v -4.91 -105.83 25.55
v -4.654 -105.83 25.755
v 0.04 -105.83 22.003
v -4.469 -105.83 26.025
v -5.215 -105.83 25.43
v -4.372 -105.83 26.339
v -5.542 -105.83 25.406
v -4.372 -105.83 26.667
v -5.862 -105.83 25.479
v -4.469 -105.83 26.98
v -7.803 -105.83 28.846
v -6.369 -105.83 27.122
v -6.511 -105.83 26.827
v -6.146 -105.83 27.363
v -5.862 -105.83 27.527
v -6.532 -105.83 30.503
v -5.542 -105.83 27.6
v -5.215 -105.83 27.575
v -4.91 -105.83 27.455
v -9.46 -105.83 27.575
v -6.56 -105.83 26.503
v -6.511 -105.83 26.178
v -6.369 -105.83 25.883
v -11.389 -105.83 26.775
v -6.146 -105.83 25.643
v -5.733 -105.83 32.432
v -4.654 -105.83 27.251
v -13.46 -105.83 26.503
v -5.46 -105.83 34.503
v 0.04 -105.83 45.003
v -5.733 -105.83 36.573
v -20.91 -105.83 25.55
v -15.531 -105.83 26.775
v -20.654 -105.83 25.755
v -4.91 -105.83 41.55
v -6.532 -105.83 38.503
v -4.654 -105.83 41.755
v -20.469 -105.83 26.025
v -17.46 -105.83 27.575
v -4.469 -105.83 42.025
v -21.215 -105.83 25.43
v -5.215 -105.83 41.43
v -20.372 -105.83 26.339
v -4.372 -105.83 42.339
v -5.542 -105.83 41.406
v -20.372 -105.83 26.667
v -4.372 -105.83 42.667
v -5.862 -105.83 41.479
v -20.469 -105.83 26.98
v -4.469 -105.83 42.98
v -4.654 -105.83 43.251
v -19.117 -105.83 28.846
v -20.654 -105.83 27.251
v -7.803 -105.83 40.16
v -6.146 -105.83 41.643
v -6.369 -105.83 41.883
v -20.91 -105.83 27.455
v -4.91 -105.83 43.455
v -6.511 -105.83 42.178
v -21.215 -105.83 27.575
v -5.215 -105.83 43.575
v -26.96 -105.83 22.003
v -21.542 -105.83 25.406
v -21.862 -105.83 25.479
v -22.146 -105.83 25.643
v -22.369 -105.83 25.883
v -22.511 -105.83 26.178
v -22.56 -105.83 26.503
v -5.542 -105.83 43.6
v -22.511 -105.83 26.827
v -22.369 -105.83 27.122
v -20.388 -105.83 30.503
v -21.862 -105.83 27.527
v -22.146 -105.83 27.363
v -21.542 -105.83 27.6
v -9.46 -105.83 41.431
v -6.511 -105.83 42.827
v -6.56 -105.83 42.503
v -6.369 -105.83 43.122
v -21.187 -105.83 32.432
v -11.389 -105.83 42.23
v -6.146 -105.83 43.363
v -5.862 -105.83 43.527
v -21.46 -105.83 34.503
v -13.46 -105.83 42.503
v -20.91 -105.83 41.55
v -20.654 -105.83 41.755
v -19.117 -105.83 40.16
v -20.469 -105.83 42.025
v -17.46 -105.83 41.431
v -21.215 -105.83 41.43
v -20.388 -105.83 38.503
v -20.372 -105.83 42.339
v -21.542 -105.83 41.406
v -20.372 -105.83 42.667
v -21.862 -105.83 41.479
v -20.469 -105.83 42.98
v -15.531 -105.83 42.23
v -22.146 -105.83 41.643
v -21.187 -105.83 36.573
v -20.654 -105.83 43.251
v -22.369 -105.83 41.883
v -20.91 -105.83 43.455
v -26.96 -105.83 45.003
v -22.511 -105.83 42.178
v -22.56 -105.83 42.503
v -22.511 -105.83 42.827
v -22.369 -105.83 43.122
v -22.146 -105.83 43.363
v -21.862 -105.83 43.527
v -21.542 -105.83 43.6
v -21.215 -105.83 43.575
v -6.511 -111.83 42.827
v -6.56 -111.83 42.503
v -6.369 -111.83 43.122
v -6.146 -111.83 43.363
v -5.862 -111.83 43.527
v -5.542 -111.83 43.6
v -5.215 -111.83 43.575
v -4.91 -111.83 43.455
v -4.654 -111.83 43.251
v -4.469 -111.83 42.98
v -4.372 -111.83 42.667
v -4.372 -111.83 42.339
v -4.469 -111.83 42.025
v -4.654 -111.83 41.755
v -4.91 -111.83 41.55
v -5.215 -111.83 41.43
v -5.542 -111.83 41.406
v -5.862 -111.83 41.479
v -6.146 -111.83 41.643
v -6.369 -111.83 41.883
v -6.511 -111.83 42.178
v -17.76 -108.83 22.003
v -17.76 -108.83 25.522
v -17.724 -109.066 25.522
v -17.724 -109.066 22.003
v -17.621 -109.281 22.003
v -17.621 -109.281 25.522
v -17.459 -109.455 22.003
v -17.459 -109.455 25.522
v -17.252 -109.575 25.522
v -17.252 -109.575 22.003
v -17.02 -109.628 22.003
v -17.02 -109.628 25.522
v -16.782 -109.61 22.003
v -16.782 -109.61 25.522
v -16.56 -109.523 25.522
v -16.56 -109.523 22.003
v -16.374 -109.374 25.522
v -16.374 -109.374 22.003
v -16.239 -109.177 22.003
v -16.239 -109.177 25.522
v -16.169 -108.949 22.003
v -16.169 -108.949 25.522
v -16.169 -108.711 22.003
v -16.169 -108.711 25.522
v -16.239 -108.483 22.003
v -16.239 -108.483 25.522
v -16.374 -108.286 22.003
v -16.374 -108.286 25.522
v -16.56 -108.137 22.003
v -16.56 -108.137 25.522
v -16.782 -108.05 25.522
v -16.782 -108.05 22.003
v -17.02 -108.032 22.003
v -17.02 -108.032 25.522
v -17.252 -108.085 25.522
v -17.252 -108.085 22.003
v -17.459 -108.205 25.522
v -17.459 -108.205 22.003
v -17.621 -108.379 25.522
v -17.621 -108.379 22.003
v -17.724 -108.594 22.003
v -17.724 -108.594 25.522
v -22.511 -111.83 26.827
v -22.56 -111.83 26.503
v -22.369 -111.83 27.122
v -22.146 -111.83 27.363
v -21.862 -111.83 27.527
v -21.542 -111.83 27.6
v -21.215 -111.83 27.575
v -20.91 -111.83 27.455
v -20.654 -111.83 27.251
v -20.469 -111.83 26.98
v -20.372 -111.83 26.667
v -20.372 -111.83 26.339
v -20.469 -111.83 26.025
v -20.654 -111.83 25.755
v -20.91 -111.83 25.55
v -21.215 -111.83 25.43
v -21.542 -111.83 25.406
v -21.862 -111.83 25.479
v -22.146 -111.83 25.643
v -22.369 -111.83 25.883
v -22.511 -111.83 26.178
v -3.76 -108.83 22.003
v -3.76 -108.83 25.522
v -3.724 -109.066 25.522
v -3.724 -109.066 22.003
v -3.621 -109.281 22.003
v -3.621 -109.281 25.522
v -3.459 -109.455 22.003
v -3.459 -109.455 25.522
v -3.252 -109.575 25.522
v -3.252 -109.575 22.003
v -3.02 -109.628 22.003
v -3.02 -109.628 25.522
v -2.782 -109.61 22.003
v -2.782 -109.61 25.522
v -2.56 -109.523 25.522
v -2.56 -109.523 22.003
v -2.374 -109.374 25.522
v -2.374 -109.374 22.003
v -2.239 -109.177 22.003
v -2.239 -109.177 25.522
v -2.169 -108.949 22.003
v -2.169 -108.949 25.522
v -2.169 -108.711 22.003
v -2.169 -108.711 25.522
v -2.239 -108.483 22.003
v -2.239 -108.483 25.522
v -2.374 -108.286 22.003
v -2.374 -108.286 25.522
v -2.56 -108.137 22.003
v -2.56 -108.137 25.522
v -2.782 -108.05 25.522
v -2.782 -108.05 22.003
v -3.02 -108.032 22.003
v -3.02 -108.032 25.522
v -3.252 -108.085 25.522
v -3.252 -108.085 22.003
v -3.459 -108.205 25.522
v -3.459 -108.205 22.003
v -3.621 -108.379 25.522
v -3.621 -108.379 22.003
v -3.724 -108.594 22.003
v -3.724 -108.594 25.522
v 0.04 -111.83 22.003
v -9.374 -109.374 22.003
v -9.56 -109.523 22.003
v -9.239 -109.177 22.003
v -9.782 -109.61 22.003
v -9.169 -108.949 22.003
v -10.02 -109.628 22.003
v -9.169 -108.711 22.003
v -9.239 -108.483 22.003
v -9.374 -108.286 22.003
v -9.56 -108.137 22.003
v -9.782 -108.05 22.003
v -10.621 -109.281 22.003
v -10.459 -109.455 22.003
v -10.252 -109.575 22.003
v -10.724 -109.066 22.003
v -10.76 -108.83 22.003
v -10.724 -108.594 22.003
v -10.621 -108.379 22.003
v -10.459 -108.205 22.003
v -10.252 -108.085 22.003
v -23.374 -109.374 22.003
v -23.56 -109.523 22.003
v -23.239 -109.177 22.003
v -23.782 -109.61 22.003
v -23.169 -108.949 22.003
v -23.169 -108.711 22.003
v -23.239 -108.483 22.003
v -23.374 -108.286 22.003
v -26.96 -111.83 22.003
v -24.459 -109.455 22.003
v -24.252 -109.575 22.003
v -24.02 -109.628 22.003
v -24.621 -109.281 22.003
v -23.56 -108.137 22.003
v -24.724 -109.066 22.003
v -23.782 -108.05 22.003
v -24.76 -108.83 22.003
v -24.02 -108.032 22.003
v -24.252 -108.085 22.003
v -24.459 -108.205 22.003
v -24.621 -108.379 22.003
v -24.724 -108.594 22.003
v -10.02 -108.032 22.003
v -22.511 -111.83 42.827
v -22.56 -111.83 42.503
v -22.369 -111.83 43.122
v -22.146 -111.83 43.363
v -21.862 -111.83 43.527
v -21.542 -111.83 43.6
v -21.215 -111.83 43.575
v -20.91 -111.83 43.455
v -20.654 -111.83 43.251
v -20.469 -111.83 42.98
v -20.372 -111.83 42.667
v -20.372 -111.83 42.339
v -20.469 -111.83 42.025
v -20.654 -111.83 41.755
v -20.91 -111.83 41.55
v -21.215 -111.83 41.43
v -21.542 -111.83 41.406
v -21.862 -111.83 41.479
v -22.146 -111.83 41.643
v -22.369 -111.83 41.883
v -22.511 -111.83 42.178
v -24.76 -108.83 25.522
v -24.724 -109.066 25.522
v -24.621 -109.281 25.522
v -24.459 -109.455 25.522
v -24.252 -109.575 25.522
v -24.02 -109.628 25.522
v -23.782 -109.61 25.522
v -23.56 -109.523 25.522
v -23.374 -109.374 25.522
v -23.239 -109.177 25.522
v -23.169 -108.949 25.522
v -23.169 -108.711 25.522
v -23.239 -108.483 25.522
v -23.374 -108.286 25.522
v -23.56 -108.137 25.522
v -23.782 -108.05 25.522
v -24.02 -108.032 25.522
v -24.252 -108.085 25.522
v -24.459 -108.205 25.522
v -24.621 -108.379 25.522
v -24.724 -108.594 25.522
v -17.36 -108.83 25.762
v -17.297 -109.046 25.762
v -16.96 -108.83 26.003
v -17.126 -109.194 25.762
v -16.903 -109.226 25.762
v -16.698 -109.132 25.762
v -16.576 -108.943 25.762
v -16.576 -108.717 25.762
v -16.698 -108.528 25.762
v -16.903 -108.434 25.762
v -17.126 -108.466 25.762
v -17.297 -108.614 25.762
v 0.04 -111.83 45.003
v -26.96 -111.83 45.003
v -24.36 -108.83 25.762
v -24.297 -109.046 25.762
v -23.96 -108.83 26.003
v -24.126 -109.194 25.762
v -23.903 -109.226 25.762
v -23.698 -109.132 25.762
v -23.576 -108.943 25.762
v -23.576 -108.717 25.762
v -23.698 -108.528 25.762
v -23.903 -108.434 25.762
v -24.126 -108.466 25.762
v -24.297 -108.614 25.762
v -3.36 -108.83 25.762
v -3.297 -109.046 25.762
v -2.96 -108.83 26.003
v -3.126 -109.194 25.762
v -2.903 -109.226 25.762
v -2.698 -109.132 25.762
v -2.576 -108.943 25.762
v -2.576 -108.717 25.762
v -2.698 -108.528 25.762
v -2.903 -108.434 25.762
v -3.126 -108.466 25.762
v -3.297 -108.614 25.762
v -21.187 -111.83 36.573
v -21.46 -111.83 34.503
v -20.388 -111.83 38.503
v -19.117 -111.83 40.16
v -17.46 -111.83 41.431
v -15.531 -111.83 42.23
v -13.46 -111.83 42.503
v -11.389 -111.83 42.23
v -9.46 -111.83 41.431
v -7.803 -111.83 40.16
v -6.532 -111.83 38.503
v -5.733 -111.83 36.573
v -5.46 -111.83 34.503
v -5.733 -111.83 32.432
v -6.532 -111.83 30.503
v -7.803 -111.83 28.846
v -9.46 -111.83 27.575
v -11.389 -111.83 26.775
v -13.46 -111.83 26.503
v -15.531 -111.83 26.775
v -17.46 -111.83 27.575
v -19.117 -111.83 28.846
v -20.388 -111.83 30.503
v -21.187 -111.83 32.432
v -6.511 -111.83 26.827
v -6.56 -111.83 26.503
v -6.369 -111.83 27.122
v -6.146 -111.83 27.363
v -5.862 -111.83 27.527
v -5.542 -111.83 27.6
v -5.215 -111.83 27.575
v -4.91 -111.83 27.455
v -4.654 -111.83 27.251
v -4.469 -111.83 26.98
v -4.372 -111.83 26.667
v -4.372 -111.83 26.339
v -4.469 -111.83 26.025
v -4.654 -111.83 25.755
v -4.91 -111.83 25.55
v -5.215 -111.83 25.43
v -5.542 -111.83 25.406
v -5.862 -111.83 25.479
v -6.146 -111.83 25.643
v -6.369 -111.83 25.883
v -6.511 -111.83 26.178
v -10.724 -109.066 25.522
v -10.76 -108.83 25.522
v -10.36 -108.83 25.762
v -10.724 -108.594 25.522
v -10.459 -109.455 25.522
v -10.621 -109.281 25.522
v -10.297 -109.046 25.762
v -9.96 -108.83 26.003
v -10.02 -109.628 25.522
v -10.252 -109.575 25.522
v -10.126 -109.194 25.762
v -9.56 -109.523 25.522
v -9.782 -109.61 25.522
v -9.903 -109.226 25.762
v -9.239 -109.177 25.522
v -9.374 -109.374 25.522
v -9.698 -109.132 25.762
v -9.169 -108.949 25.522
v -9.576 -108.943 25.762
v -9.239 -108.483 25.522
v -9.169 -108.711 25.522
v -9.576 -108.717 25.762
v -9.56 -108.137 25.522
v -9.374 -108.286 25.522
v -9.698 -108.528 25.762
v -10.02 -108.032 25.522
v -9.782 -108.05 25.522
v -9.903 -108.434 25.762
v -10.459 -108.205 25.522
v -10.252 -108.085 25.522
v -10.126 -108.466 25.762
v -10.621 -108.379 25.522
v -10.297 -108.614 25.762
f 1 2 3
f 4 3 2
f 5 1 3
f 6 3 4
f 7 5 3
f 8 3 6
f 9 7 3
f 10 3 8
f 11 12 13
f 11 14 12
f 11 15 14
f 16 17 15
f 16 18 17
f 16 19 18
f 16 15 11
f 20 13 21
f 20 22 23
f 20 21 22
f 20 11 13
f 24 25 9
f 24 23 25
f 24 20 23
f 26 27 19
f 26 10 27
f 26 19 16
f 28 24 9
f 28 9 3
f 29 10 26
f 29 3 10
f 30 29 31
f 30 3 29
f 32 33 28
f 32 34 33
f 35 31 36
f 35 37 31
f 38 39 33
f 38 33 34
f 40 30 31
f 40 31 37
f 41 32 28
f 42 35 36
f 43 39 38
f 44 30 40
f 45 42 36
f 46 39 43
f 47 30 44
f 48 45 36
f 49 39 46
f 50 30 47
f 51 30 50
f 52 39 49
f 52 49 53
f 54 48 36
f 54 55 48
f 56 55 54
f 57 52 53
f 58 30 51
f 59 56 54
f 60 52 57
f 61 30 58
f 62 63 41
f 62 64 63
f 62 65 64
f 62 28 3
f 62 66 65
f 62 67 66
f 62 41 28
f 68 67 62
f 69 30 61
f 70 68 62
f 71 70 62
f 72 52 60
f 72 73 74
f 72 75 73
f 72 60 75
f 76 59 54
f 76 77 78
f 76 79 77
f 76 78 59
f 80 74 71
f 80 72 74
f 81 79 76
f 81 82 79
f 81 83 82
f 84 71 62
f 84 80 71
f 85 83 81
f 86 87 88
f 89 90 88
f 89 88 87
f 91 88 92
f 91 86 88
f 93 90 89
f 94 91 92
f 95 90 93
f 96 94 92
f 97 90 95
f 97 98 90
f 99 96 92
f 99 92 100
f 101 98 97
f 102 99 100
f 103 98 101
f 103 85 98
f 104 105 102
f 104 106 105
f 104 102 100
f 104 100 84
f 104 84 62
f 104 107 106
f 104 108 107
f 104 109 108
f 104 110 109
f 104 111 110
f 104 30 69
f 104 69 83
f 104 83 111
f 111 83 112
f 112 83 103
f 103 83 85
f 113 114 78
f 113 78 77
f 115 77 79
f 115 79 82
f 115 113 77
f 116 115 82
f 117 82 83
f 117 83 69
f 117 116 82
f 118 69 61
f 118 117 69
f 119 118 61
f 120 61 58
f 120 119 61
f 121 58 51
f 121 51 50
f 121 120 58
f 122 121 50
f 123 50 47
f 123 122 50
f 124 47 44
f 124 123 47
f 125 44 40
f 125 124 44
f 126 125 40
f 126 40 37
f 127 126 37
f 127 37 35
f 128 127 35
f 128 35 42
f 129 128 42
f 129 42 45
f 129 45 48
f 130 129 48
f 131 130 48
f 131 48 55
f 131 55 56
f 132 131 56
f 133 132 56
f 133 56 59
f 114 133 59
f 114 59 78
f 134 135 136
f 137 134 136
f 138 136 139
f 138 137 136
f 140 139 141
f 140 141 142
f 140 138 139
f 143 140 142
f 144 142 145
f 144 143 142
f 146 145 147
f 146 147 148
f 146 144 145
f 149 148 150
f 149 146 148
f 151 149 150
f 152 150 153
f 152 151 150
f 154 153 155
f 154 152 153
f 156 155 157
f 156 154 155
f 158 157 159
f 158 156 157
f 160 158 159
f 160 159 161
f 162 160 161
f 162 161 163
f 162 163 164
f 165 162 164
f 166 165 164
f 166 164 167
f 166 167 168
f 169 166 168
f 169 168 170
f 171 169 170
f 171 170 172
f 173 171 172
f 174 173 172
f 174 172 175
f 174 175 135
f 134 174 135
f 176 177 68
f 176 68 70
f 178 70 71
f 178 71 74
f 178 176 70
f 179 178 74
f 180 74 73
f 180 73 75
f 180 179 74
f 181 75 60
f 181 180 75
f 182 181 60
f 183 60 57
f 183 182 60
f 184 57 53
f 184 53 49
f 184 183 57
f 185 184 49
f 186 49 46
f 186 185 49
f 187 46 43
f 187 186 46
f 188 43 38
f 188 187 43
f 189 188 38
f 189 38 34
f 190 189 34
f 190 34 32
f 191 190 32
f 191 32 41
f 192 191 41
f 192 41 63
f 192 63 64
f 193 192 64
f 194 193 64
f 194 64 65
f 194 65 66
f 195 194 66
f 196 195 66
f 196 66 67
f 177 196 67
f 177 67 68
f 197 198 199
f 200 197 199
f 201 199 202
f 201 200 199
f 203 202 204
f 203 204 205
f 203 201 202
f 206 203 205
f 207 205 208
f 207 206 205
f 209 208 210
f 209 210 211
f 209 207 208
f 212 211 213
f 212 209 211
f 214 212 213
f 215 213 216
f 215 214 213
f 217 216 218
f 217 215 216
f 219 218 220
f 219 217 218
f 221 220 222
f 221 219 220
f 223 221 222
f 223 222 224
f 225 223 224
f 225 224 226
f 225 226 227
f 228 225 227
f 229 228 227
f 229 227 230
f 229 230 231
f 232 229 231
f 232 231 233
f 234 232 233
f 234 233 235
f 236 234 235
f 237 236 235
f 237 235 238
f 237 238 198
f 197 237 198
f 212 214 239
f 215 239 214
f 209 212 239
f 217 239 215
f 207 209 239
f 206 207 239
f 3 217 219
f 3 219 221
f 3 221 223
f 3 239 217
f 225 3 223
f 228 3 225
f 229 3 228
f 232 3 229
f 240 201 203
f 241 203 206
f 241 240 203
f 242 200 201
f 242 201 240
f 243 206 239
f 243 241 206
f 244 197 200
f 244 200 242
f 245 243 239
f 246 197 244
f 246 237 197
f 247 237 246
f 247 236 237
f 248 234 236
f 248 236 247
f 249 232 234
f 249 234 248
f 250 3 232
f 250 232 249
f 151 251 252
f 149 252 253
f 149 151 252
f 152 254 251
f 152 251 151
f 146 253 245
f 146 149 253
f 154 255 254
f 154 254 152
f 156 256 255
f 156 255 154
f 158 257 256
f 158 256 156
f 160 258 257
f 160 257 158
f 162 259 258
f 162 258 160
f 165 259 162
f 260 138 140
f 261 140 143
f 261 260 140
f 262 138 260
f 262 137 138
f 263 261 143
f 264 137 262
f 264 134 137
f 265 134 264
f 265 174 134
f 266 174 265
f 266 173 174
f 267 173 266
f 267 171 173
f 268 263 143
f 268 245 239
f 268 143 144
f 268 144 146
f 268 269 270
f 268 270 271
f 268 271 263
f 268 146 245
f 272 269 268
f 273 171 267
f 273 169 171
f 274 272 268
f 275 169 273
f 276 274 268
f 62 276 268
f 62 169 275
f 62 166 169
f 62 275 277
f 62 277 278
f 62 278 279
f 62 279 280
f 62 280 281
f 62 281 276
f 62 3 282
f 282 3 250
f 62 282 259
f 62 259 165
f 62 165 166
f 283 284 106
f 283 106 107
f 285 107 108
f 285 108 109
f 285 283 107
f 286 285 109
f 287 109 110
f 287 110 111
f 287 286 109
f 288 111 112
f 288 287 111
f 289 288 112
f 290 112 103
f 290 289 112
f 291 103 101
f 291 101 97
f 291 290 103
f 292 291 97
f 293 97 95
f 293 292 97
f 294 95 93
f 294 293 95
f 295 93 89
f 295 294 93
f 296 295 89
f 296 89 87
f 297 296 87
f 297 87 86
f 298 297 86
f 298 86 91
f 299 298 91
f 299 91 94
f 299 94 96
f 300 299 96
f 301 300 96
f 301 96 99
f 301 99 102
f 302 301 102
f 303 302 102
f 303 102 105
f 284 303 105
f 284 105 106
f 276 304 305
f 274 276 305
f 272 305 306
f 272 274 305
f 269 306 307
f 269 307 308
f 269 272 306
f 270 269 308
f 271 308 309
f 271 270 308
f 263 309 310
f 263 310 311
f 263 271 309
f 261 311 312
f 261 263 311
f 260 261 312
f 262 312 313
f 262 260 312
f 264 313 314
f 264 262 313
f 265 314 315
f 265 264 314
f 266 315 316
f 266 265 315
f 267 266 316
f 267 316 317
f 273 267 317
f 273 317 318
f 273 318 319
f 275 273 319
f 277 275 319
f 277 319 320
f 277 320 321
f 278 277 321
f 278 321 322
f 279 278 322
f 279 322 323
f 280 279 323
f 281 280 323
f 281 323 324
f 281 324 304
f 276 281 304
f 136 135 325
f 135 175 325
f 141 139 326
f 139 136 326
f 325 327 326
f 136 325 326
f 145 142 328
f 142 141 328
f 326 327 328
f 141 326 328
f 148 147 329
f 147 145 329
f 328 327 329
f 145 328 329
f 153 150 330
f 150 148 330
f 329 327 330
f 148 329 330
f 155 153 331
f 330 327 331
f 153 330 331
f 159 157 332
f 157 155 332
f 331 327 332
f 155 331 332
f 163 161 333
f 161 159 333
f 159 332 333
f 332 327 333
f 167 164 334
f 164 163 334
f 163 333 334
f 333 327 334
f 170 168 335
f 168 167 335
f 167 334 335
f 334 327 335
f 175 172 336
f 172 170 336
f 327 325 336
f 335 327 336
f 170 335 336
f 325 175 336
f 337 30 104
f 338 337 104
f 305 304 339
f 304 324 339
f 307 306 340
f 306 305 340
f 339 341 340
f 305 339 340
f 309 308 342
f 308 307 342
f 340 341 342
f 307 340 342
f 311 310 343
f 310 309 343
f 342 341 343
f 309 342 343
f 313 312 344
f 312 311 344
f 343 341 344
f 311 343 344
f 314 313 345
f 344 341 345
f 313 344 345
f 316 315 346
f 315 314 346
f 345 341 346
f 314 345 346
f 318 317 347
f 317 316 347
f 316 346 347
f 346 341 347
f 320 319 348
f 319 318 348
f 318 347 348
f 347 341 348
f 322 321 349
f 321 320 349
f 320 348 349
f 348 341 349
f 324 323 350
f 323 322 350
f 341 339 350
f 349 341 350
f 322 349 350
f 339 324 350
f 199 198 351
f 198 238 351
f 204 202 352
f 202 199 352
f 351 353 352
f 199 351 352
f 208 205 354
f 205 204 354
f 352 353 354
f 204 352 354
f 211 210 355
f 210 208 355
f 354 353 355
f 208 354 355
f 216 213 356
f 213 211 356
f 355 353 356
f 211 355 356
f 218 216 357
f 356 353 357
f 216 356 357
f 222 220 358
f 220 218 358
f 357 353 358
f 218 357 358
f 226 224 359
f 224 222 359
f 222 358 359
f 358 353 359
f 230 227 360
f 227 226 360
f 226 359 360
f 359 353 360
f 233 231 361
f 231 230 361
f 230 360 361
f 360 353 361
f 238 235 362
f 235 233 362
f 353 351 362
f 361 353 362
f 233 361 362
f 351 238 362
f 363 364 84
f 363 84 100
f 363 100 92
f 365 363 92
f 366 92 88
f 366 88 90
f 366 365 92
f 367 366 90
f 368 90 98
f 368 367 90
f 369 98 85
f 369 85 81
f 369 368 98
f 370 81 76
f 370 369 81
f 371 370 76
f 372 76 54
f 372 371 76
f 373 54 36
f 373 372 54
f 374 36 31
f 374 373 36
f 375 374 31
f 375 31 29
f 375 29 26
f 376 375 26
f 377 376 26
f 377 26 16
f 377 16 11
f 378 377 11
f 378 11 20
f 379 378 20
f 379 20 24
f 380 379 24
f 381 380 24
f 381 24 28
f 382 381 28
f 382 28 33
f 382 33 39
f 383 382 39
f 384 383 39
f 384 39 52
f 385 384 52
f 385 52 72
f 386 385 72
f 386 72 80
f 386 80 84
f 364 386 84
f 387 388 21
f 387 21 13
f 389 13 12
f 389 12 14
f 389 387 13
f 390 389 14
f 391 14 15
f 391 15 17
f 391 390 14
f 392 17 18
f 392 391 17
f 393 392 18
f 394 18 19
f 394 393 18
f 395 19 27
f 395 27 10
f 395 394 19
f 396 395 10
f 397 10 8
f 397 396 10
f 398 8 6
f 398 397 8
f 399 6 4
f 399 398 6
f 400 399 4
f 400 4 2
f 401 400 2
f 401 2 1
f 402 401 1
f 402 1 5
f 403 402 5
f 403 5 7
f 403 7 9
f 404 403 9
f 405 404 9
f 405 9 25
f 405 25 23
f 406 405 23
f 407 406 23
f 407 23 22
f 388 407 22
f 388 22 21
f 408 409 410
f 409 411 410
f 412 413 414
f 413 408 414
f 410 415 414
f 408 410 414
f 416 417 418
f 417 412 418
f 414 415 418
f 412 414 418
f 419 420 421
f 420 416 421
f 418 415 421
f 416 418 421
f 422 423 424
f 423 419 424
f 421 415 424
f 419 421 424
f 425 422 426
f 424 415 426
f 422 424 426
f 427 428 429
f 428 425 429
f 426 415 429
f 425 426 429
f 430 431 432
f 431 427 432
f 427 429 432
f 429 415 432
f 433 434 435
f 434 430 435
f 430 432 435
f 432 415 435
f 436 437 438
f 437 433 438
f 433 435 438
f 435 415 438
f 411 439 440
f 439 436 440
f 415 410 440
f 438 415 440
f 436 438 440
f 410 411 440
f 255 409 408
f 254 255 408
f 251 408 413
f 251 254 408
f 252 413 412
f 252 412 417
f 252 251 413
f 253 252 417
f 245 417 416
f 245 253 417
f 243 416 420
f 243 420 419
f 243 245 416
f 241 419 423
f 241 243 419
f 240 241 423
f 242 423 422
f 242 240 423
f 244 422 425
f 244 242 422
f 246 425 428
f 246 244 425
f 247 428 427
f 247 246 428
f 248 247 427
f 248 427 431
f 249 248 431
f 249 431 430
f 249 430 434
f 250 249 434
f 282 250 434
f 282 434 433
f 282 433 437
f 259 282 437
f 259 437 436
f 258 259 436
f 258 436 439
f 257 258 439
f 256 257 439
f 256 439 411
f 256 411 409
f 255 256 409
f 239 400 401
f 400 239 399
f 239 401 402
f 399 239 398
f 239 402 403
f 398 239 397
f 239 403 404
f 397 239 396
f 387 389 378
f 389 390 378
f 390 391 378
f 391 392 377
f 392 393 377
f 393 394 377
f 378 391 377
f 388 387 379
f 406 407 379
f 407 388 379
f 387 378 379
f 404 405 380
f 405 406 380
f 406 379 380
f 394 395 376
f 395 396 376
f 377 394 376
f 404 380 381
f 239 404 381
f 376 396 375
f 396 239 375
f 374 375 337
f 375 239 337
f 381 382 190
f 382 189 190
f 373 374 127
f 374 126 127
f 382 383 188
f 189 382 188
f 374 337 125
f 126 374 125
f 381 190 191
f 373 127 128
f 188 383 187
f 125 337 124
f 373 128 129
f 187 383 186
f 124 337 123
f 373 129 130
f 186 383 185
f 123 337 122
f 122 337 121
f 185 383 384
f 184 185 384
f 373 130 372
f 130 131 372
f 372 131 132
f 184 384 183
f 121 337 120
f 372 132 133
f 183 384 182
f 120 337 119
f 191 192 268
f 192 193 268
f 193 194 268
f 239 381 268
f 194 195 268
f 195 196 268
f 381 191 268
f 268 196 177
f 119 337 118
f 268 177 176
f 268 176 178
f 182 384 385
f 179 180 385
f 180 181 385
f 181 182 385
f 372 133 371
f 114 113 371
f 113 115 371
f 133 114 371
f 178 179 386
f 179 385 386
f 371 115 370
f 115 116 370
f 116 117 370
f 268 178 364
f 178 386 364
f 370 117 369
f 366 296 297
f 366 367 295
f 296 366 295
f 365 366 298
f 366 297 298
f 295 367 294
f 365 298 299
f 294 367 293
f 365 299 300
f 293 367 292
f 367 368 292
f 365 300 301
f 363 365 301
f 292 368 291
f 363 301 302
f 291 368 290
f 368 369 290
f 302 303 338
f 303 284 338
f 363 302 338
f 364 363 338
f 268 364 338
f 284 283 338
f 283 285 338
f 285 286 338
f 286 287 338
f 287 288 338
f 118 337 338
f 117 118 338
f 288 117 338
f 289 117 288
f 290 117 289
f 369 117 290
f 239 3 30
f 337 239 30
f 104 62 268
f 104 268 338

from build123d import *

# Parameters (mm, degrees)
SKETCH040_W    = 27
SKETCH040_H    = 23
PAD011_DEPTH   = 6
SKETCH041_R    = 8
HOLE013_DEPTH  = 25
SKETCH042_R    = 1.1
HOLE014_DEPTH  = 25
SKETCH043_R    = 0.8
HOLE015_DEPTH  = 3.519312
HOLE015_TIPS_R = 0.8


with BuildPart() as fix:
    # Sketch040 → Pad011 (new body)
    with BuildSketch(Plane.XZ):
        with Locations((-42.54, 19.462705)):
            Rectangle(SKETCH040_W, SKETCH040_H)
    extrude(amount=PAD011_DEPTH)

    # Sketch041 (on Face6 of Pad011) → Hole013 (cut)
    with BuildSketch(Plane.XZ.offset(6)):
        with Locations((-42.54, 20.462705)):
            Circle(SKETCH041_R)
    extrude(amount=-HOLE013_DEPTH, mode=Mode.SUBTRACT)

    # Sketch042 (on Face5 of Hole013) → Hole014 (cut)
    with BuildSketch(Plane.XZ.offset(6)):
        with Locations((-50.54, 28.462705)):
            Circle(SKETCH042_R)
        with Locations((-34.54, 28.462705)):
            Circle(SKETCH042_R)
        with Locations((-50.54, 12.462705)):
            Circle(SKETCH042_R)
        with Locations((-34.54, 12.462705)):
            Circle(SKETCH042_R)
    extrude(amount=-HOLE014_DEPTH, mode=Mode.SUBTRACT)

    # Sketch043 (on Face6 of Hole014) → Hole015 (cut)
    with BuildSketch(Plane(origin=(0, 0, 7.962705), x_dir=(1, 0, 0), z_dir=(0, 0, -1))):
        with Locations((-53.04, 3)):
            Circle(SKETCH043_R)
        with Locations((-46.04, 3)):
            Circle(SKETCH043_R)
        with Locations((-39.04, 3)):
            Circle(SKETCH043_R)
        with Locations((-32.04, 3)):
            Circle(SKETCH043_R)
    extrude(amount=-HOLE015_DEPTH, mode=Mode.SUBTRACT)

    # Hole015 tips → Hole015 tip 1 section 0
    with BuildSketch(Plane(origin=(0, 0, 11.482016), x_dir=(1, 0, 0), z_dir=(0, 0, -1)), mode=Mode.PRIVATE) as hole015_tip_1_s0:
        with Locations((-53.04, 3)):
            Circle(HOLE015_TIPS_R)
    loft([hole015_tip_1_s0.sketch, Vertex(-53.04, -3, 11.962705)], mode=Mode.SUBTRACT)

    # Hole015 tips → Hole015 tip 2 section 0
    with BuildSketch(Plane(origin=(0, 0, 11.482016), x_dir=(1, 0, 0), z_dir=(0, 0, -1)), mode=Mode.PRIVATE) as hole015_tip_2_s0:
        with Locations((-46.04, 3)):
            Circle(HOLE015_TIPS_R)
    loft([hole015_tip_2_s0.sketch, Vertex(-46.04, -3, 11.962705)], mode=Mode.SUBTRACT)

    # Hole015 tips → Hole015 tip 3 section 0
    with BuildSketch(Plane(origin=(0, 0, 11.482016), x_dir=(1, 0, 0), z_dir=(0, 0, -1)), mode=Mode.PRIVATE) as hole015_tip_3_s0:
        with Locations((-39.04, 3)):
            Circle(HOLE015_TIPS_R)
    loft([hole015_tip_3_s0.sketch, Vertex(-39.04, -3, 11.962705)], mode=Mode.SUBTRACT)

    # Hole015 tips → Hole015 tip 4 section 0
    with BuildSketch(Plane(origin=(0, 0, 11.482016), x_dir=(1, 0, 0), z_dir=(0, 0, -1)), mode=Mode.PRIVATE) as hole015_tip_4_s0:
        with Locations((-32.04, 3)):
            Circle(HOLE015_TIPS_R)
    loft([hole015_tip_4_s0.sketch, Vertex(-32.04, -3, 11.962705)], mode=Mode.SUBTRACT)


with BuildPart() as fix_1:
    # Body006021004 placement: moved
    add(fix.part.moved(Location((0, -105.83, -1.96))))


with BuildPart() as part_mirroring001:
    # Part__Mirroring001: instance of Fix
    add(fix_1.part.mirror(Plane(origin=(0, 0, 0), x_dir=(0, -1, 0), z_dir=(1, 0, 0))))


with BuildPart() as part_mirroring001_1:
    # Part__Mirroring001 placement: moved
    add(part_mirroring001.part.moved(Location((-56, 0, 16))))


solid = part_mirroring001_1.part
